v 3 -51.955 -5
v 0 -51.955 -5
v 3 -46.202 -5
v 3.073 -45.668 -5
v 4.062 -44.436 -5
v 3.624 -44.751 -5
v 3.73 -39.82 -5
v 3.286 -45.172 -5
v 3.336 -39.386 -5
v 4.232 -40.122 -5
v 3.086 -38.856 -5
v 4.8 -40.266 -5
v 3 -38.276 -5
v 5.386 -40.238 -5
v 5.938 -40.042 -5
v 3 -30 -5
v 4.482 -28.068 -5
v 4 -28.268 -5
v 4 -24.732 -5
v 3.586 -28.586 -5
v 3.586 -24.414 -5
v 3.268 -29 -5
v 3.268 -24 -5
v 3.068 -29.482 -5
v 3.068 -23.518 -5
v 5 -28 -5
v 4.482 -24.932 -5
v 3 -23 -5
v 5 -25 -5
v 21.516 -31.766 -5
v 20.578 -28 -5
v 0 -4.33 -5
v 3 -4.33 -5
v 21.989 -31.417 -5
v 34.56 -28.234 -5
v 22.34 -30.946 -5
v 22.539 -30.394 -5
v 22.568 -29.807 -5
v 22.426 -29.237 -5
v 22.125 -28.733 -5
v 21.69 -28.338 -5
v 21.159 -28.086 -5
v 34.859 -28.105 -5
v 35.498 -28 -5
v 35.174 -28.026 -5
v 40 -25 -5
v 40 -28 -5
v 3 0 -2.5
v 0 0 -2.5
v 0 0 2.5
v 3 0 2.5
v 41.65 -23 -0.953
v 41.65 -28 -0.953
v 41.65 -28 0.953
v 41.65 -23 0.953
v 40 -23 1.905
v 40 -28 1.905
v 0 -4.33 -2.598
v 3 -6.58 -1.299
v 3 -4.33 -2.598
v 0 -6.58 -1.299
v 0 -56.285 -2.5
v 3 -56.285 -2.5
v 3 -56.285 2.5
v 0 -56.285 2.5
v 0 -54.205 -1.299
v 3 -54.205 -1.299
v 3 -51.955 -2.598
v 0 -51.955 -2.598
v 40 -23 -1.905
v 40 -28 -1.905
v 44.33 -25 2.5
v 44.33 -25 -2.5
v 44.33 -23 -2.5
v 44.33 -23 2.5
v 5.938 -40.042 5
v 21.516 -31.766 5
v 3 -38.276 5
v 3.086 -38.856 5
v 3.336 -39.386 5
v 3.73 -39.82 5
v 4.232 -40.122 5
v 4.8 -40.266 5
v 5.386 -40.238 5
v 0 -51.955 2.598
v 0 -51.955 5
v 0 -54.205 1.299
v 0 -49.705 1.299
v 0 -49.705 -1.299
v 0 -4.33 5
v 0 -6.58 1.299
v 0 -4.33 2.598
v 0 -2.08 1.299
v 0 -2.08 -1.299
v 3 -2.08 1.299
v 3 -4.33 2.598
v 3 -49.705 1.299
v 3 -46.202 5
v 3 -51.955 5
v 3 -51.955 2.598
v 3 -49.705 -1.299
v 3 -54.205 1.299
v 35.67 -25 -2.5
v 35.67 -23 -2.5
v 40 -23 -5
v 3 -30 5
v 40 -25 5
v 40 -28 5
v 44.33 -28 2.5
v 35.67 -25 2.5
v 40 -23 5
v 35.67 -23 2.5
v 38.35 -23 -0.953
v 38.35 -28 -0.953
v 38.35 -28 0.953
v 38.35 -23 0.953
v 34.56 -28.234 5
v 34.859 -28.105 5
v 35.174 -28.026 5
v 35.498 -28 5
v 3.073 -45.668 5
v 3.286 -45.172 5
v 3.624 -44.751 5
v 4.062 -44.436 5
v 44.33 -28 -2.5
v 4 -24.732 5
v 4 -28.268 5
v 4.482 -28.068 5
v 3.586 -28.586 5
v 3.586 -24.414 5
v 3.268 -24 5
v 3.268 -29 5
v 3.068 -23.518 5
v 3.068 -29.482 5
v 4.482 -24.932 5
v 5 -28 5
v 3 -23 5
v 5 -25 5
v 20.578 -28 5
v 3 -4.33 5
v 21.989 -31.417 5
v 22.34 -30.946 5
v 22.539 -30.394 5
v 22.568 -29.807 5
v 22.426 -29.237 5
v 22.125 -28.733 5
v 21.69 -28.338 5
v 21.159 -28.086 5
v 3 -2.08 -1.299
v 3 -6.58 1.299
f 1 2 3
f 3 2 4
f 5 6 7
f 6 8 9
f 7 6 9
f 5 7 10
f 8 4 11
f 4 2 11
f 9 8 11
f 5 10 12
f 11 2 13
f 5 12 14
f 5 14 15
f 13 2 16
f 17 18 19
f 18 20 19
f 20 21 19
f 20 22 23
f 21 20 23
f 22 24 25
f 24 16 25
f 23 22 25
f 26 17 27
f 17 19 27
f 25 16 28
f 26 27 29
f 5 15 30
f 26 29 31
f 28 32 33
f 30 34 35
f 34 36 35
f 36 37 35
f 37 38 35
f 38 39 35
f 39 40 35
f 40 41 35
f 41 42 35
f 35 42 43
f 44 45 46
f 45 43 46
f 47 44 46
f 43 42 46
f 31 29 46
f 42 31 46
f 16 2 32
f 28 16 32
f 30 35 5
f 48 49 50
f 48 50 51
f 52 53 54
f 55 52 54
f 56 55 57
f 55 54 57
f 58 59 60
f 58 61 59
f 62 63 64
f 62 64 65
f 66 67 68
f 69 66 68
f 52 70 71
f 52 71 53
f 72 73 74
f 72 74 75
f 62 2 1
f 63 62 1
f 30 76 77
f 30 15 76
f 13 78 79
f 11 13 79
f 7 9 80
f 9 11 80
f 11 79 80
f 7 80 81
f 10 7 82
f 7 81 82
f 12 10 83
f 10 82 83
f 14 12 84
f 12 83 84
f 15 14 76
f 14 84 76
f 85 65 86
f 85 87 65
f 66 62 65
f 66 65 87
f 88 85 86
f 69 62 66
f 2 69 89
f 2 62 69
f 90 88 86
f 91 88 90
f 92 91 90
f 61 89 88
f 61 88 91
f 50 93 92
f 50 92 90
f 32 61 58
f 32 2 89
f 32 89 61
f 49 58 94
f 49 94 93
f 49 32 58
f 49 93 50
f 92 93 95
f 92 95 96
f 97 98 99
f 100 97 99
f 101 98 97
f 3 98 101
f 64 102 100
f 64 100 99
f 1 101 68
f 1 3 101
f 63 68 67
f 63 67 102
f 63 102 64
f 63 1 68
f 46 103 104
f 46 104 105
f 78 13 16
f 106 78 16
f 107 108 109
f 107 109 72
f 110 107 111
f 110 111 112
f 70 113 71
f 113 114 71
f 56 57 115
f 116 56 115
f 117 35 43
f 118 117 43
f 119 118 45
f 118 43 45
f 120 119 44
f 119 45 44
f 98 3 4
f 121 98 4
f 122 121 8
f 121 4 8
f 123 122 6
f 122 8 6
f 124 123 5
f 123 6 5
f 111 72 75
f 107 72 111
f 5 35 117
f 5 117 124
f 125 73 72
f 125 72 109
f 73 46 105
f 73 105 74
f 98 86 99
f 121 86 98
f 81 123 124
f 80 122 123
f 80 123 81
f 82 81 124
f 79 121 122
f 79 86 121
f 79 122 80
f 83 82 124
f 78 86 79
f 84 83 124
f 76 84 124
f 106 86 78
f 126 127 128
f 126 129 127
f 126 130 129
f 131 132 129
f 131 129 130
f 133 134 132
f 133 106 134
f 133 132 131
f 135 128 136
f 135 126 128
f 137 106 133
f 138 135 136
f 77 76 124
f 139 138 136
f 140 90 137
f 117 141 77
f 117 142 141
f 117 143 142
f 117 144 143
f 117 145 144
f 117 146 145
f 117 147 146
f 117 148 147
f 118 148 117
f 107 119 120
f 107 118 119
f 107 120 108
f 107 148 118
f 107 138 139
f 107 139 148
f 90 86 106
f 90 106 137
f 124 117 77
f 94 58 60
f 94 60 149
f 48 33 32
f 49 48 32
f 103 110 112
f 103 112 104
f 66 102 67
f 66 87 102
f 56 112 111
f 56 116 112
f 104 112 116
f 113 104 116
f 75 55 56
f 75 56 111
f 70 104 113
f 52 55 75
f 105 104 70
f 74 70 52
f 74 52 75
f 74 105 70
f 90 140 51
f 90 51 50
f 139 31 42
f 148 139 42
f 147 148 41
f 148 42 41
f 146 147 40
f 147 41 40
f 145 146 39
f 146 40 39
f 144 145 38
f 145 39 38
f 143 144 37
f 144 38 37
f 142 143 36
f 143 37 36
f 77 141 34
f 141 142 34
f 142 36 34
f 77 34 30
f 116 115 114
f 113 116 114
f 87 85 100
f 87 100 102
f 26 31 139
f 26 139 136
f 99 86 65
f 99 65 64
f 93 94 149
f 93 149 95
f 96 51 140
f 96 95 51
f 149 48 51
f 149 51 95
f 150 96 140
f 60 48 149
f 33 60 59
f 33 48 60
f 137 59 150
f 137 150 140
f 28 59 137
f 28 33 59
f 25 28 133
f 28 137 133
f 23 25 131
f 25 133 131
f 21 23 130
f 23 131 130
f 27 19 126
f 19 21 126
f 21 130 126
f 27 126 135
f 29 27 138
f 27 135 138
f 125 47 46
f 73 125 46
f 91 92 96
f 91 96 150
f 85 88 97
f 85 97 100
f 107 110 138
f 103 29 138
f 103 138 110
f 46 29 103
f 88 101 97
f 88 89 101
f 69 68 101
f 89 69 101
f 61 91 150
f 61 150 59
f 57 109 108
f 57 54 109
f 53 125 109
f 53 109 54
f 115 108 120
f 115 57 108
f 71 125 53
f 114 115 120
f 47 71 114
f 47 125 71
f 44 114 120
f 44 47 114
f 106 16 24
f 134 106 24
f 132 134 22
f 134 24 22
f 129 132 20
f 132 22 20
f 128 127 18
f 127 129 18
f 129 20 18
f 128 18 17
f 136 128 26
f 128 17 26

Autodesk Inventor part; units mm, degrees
ref_plane "YZ Plane" through (0, 0, 0) normal (1, 0, 0) x (0, 1, 0)
ref_plane "XZ Plane" through (0, 0, 0) normal (0, 1, 0) x (-1, 0, 0)
ref_plane "XY Plane" through (0, 0, 0) normal (0, 0, 1) x (1, 0, 0)
sketch "Sketch1" plane through (0, 0, 0) normal (0, 0, 1) x (1, 0, 0)
  line L0 (3, -25) -> (44.33, -25)
  line L1 (44.33, -25) -> (44.33, -28)
  line L2 (44.33, -28) -> (35, -28)
  line L3 (35, -28) -> (3, -45)
  line L4 (3, -45) -> (3, -56.285)
  line L5 (3, -56.285) -> (0, -56.285)
  line L6 (0, -56.285) -> (0, 0)
  line L7 (3, -41.6029) -> (28.6055, -28)
  line L8 (28.6055, -28) -> (3, -28)
  line L9 (3, -41.6029) -> (3, -28)
  line L10 (0, -4.33) -> (3, -4.33) construction
  line L11 (0, -2.08) -> (3, -2.08) construction
  line L12 (0, -6.58) -> (3, -6.58) construction
  line L13 (0, -51.955) -> (3, -51.955) construction
  line L14 (0, -49.705) -> (3, -49.705) construction
  line L15 (0, -54.205) -> (3, -54.205) construction
  line L16 (40, -25) -> (40, -28) construction
  line L17 (0, 0) -> (3, 0)
  line L18 (3, 0) -> (3, -25)
  dimension "d1" = 3
  dimension "d2" = 3
  dimension "d3" = 3
  dimension "d6" = 20
  dimension "d8" = 4.5
  dimension "d13" = 47.625
  dimension "d18" = 40
  dimension "d48" = 4.33
  dimension "d49" = 5
  dimension "d55" = 4.33
  dimension "d56" = 25
  dimension "d59" = 4.33
extrude "Extrusion1" add sketch "Sketch1" along normal mid plane 10
fillet "Fillet2" radius 2 6 edges at (3, -45, 0) (35, -28, 0) (28.6055, -28, 0) (3, -41.6029, 0) (3, -28, 0) (3, -25, 0)
sketch "Sketch3" plane through (0, -56.285, 5) normal (-1, 0, 0) x (0, 0, 1)
  line L0 (-2.4019, 51.955) -> (-3.701, 49.705)
  line L1 (-3.701, 49.705) -> (-6.299, 49.705)
  line L2 (-6.299, 49.705) -> (-7.5981, 51.955)
  line L3 (-7.5981, 51.955) -> (-6.299, 54.205)
  line L4 (-6.299, 54.205) -> (-3.701, 54.205)
  line L5 (-3.701, 54.205) -> (-2.4019, 51.955)
  line L6 (-6.299, 6.58) -> (-3.701, 6.58)
  line L7 (-3.701, 6.58) -> (-2.4019, 4.33)
  line L8 (-2.4019, 4.33) -> (-3.701, 2.08)
  line L9 (-3.701, 2.08) -> (-6.299, 2.08)
  line L10 (-6.299, 2.08) -> (-7.5981, 4.33)
  line L11 (-7.5981, 4.33) -> (-6.299, 6.58)
  point P0 (-5, 56.285)
  point P1 (-5, 51.955)
  point P2 (-5, 51.955)
  point P3 (-5, 4.33)
  point P4 (-5, 4.33)
  dimension "d60" = 4.5
extrude "Extrusion3" cut sketch "Sketch3" against normal through all
sketch "Sketch4" plane through (44.33, -25, 5) normal (0, 1, 0) x (1, 0, 0)
  line L0 (-39.33, 10) -> (0, 10) construction
  line L1 (-4.33, 10) -> (0.0001, 7.5)
  line L2 (0.0001, 7.5) -> (0.0001, 2.5)
  line L3 (0.0001, 2.5) -> (-4.33, 0)
  line L4 (-4.33, 0) -> (-8.6601, 2.5)
  line L5 (-8.6601, 2.5) -> (-8.6601, 7.5)
  line L6 (-8.6601, 7.5) -> (-4.33, 10)
  line L7 (-4.33, 6.9053) -> (-2.68, 5.9526)
  line L8 (-2.68, 5.9526) -> (-2.68, 4.0474)
  line L9 (-2.68, 4.0474) -> (-4.33, 3.0947)
  line L10 (-4.33, 3.0947) -> (-5.98, 4.0474)
  line L11 (-5.98, 4.0474) -> (-5.98, 5.9526)
  line L12 (-5.98, 5.9526) -> (-4.33, 6.9053)
  point P0 (-44.33, 5)
  point P1 (-4.33, 5)
  point P2 (-4.33, 5)
  point P3 (-4.33, 5)
  dimension "d63" = 3.3
extrude "Extrusion4" add sketch "Sketch4" along normal blind 2
extrude "Extrusion5" cut sketch "Sketch4" against normal through all contours L7 L8 L9 L10 L11 L12
chamfer "Chamfer1" distance 2.5 angle 60 2 edges at (44.33, -26.5, 5) (44.33, -26.5, -5) measured on face at (44.33, -27, -0.8334)
chamfer "Chamfer2" distance 2.5 angle 60 2 edges at (1.5, 0, -5) (1.5, 0, 5) measured on face at (2, 0, -1.6667)
chamfer "Chamfer3" distance 2.5 angle 60 2 edges at (1.5, -56.285, 5) (1.5, -56.285, -5) measured on face at (2, -56.285, 1.6667)
properties part number "GPS_holder"
